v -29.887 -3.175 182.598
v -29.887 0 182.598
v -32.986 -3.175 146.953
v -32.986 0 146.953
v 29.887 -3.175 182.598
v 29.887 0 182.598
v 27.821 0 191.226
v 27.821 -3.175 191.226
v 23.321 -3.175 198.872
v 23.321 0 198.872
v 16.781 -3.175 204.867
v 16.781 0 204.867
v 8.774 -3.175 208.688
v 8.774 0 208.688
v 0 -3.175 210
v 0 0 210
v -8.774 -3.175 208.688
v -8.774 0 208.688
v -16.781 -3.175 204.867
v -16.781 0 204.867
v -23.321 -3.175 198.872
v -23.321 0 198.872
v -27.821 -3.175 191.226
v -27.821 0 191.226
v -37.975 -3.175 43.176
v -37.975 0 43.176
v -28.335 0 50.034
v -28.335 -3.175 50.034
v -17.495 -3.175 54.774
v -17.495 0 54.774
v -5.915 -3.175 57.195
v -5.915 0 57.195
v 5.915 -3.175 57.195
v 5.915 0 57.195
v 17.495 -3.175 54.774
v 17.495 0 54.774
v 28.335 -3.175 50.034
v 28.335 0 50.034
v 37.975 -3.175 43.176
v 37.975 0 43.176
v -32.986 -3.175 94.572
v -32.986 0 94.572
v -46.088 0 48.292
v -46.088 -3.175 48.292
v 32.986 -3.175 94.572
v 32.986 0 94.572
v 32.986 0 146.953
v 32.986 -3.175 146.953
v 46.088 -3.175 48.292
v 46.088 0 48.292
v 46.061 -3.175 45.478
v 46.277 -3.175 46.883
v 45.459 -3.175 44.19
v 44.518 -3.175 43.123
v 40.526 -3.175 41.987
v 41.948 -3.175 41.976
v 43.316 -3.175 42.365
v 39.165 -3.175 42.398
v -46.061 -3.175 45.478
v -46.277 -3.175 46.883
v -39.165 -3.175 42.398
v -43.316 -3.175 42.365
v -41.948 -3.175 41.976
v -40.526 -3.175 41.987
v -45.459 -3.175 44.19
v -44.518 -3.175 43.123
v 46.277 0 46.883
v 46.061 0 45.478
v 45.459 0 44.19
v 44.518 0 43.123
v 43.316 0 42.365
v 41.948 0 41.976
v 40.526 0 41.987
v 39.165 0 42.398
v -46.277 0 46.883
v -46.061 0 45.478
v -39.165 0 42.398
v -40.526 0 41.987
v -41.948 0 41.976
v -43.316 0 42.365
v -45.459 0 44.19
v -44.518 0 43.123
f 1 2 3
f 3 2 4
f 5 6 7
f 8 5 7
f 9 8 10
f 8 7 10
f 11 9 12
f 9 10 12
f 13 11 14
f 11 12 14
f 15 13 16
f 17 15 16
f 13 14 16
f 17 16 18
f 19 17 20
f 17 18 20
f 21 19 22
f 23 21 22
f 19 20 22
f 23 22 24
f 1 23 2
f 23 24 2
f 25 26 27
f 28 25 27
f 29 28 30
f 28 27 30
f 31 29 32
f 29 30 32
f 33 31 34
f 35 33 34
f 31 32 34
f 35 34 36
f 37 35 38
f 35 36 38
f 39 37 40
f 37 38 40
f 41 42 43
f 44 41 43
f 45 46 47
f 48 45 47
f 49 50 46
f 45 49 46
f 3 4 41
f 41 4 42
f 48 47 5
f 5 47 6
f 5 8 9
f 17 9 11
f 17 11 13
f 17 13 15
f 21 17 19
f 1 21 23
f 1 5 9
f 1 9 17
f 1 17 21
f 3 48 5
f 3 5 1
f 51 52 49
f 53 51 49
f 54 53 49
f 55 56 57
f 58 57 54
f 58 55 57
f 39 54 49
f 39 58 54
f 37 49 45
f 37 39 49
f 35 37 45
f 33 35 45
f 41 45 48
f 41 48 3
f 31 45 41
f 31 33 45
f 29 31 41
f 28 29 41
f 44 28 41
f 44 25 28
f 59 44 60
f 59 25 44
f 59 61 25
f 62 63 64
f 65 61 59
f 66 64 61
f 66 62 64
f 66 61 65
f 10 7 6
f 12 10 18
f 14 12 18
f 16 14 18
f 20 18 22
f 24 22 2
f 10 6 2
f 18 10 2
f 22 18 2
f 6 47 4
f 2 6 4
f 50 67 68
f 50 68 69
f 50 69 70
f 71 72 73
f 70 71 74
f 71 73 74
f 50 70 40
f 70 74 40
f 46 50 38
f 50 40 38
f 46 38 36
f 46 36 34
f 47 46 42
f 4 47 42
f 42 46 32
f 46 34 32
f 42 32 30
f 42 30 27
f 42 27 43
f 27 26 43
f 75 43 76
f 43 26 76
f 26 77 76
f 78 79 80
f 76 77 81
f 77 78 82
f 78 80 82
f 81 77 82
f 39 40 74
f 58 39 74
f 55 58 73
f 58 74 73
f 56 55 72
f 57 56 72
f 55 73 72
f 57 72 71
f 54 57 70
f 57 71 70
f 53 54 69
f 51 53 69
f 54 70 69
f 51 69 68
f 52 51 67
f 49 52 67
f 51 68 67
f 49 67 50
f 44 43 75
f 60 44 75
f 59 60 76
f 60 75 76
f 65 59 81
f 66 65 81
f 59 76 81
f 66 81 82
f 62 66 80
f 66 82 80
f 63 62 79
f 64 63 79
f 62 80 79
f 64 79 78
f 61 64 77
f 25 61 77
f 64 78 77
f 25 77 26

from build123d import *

# Parameters (mm, degrees)
BASE_FLANGE1_DEPTH = 3.175


# Sheet-metal steps are written as plain solids
with BuildPart() as part:
    # Sketch1 → Base-Flange1 (new body)
    with BuildSketch(Plane(origin=(0, 0, 0), x_dir=(1, 0, 0), z_dir=(0, 1, 0))):
        with BuildLine():
            Line((-29.887299957, -182.597941739), (-32.985733317, -146.952874795))
            Line((-32.985733317, -146.952874795), (-32.985733317, -94.571650999))
            Line((-32.985733317, -94.571650999), (-46.087855458, -48.292438117))
            ThreePointArc((-46.087855458, -48.292438117), (-43.944076056, -42.701188324), (-37.974785272, -43.175985032))
            ThreePointArc((-37.974785272, -43.175985032), (0, -57.5), (37.974785272, -43.175985032))
            ThreePointArc((37.974785272, -43.175985032), (43.944076056, -42.701188324), (46.087855458, -48.292438117))
            Line((46.087855458, -48.292438117), (32.985733317, -94.571650999))
            Line((32.985733317, -94.571650999), (32.985733317, -146.952874795))
            Line((32.985733317, -146.952874795), (29.887299957, -182.597941739))
            ThreePointArc((29.887299957, -182.597941739), (0, -210), (-29.887299957, -182.597941739))
        make_face()
    extrude(amount=-BASE_FLANGE1_DEPTH)


solid = part.part
